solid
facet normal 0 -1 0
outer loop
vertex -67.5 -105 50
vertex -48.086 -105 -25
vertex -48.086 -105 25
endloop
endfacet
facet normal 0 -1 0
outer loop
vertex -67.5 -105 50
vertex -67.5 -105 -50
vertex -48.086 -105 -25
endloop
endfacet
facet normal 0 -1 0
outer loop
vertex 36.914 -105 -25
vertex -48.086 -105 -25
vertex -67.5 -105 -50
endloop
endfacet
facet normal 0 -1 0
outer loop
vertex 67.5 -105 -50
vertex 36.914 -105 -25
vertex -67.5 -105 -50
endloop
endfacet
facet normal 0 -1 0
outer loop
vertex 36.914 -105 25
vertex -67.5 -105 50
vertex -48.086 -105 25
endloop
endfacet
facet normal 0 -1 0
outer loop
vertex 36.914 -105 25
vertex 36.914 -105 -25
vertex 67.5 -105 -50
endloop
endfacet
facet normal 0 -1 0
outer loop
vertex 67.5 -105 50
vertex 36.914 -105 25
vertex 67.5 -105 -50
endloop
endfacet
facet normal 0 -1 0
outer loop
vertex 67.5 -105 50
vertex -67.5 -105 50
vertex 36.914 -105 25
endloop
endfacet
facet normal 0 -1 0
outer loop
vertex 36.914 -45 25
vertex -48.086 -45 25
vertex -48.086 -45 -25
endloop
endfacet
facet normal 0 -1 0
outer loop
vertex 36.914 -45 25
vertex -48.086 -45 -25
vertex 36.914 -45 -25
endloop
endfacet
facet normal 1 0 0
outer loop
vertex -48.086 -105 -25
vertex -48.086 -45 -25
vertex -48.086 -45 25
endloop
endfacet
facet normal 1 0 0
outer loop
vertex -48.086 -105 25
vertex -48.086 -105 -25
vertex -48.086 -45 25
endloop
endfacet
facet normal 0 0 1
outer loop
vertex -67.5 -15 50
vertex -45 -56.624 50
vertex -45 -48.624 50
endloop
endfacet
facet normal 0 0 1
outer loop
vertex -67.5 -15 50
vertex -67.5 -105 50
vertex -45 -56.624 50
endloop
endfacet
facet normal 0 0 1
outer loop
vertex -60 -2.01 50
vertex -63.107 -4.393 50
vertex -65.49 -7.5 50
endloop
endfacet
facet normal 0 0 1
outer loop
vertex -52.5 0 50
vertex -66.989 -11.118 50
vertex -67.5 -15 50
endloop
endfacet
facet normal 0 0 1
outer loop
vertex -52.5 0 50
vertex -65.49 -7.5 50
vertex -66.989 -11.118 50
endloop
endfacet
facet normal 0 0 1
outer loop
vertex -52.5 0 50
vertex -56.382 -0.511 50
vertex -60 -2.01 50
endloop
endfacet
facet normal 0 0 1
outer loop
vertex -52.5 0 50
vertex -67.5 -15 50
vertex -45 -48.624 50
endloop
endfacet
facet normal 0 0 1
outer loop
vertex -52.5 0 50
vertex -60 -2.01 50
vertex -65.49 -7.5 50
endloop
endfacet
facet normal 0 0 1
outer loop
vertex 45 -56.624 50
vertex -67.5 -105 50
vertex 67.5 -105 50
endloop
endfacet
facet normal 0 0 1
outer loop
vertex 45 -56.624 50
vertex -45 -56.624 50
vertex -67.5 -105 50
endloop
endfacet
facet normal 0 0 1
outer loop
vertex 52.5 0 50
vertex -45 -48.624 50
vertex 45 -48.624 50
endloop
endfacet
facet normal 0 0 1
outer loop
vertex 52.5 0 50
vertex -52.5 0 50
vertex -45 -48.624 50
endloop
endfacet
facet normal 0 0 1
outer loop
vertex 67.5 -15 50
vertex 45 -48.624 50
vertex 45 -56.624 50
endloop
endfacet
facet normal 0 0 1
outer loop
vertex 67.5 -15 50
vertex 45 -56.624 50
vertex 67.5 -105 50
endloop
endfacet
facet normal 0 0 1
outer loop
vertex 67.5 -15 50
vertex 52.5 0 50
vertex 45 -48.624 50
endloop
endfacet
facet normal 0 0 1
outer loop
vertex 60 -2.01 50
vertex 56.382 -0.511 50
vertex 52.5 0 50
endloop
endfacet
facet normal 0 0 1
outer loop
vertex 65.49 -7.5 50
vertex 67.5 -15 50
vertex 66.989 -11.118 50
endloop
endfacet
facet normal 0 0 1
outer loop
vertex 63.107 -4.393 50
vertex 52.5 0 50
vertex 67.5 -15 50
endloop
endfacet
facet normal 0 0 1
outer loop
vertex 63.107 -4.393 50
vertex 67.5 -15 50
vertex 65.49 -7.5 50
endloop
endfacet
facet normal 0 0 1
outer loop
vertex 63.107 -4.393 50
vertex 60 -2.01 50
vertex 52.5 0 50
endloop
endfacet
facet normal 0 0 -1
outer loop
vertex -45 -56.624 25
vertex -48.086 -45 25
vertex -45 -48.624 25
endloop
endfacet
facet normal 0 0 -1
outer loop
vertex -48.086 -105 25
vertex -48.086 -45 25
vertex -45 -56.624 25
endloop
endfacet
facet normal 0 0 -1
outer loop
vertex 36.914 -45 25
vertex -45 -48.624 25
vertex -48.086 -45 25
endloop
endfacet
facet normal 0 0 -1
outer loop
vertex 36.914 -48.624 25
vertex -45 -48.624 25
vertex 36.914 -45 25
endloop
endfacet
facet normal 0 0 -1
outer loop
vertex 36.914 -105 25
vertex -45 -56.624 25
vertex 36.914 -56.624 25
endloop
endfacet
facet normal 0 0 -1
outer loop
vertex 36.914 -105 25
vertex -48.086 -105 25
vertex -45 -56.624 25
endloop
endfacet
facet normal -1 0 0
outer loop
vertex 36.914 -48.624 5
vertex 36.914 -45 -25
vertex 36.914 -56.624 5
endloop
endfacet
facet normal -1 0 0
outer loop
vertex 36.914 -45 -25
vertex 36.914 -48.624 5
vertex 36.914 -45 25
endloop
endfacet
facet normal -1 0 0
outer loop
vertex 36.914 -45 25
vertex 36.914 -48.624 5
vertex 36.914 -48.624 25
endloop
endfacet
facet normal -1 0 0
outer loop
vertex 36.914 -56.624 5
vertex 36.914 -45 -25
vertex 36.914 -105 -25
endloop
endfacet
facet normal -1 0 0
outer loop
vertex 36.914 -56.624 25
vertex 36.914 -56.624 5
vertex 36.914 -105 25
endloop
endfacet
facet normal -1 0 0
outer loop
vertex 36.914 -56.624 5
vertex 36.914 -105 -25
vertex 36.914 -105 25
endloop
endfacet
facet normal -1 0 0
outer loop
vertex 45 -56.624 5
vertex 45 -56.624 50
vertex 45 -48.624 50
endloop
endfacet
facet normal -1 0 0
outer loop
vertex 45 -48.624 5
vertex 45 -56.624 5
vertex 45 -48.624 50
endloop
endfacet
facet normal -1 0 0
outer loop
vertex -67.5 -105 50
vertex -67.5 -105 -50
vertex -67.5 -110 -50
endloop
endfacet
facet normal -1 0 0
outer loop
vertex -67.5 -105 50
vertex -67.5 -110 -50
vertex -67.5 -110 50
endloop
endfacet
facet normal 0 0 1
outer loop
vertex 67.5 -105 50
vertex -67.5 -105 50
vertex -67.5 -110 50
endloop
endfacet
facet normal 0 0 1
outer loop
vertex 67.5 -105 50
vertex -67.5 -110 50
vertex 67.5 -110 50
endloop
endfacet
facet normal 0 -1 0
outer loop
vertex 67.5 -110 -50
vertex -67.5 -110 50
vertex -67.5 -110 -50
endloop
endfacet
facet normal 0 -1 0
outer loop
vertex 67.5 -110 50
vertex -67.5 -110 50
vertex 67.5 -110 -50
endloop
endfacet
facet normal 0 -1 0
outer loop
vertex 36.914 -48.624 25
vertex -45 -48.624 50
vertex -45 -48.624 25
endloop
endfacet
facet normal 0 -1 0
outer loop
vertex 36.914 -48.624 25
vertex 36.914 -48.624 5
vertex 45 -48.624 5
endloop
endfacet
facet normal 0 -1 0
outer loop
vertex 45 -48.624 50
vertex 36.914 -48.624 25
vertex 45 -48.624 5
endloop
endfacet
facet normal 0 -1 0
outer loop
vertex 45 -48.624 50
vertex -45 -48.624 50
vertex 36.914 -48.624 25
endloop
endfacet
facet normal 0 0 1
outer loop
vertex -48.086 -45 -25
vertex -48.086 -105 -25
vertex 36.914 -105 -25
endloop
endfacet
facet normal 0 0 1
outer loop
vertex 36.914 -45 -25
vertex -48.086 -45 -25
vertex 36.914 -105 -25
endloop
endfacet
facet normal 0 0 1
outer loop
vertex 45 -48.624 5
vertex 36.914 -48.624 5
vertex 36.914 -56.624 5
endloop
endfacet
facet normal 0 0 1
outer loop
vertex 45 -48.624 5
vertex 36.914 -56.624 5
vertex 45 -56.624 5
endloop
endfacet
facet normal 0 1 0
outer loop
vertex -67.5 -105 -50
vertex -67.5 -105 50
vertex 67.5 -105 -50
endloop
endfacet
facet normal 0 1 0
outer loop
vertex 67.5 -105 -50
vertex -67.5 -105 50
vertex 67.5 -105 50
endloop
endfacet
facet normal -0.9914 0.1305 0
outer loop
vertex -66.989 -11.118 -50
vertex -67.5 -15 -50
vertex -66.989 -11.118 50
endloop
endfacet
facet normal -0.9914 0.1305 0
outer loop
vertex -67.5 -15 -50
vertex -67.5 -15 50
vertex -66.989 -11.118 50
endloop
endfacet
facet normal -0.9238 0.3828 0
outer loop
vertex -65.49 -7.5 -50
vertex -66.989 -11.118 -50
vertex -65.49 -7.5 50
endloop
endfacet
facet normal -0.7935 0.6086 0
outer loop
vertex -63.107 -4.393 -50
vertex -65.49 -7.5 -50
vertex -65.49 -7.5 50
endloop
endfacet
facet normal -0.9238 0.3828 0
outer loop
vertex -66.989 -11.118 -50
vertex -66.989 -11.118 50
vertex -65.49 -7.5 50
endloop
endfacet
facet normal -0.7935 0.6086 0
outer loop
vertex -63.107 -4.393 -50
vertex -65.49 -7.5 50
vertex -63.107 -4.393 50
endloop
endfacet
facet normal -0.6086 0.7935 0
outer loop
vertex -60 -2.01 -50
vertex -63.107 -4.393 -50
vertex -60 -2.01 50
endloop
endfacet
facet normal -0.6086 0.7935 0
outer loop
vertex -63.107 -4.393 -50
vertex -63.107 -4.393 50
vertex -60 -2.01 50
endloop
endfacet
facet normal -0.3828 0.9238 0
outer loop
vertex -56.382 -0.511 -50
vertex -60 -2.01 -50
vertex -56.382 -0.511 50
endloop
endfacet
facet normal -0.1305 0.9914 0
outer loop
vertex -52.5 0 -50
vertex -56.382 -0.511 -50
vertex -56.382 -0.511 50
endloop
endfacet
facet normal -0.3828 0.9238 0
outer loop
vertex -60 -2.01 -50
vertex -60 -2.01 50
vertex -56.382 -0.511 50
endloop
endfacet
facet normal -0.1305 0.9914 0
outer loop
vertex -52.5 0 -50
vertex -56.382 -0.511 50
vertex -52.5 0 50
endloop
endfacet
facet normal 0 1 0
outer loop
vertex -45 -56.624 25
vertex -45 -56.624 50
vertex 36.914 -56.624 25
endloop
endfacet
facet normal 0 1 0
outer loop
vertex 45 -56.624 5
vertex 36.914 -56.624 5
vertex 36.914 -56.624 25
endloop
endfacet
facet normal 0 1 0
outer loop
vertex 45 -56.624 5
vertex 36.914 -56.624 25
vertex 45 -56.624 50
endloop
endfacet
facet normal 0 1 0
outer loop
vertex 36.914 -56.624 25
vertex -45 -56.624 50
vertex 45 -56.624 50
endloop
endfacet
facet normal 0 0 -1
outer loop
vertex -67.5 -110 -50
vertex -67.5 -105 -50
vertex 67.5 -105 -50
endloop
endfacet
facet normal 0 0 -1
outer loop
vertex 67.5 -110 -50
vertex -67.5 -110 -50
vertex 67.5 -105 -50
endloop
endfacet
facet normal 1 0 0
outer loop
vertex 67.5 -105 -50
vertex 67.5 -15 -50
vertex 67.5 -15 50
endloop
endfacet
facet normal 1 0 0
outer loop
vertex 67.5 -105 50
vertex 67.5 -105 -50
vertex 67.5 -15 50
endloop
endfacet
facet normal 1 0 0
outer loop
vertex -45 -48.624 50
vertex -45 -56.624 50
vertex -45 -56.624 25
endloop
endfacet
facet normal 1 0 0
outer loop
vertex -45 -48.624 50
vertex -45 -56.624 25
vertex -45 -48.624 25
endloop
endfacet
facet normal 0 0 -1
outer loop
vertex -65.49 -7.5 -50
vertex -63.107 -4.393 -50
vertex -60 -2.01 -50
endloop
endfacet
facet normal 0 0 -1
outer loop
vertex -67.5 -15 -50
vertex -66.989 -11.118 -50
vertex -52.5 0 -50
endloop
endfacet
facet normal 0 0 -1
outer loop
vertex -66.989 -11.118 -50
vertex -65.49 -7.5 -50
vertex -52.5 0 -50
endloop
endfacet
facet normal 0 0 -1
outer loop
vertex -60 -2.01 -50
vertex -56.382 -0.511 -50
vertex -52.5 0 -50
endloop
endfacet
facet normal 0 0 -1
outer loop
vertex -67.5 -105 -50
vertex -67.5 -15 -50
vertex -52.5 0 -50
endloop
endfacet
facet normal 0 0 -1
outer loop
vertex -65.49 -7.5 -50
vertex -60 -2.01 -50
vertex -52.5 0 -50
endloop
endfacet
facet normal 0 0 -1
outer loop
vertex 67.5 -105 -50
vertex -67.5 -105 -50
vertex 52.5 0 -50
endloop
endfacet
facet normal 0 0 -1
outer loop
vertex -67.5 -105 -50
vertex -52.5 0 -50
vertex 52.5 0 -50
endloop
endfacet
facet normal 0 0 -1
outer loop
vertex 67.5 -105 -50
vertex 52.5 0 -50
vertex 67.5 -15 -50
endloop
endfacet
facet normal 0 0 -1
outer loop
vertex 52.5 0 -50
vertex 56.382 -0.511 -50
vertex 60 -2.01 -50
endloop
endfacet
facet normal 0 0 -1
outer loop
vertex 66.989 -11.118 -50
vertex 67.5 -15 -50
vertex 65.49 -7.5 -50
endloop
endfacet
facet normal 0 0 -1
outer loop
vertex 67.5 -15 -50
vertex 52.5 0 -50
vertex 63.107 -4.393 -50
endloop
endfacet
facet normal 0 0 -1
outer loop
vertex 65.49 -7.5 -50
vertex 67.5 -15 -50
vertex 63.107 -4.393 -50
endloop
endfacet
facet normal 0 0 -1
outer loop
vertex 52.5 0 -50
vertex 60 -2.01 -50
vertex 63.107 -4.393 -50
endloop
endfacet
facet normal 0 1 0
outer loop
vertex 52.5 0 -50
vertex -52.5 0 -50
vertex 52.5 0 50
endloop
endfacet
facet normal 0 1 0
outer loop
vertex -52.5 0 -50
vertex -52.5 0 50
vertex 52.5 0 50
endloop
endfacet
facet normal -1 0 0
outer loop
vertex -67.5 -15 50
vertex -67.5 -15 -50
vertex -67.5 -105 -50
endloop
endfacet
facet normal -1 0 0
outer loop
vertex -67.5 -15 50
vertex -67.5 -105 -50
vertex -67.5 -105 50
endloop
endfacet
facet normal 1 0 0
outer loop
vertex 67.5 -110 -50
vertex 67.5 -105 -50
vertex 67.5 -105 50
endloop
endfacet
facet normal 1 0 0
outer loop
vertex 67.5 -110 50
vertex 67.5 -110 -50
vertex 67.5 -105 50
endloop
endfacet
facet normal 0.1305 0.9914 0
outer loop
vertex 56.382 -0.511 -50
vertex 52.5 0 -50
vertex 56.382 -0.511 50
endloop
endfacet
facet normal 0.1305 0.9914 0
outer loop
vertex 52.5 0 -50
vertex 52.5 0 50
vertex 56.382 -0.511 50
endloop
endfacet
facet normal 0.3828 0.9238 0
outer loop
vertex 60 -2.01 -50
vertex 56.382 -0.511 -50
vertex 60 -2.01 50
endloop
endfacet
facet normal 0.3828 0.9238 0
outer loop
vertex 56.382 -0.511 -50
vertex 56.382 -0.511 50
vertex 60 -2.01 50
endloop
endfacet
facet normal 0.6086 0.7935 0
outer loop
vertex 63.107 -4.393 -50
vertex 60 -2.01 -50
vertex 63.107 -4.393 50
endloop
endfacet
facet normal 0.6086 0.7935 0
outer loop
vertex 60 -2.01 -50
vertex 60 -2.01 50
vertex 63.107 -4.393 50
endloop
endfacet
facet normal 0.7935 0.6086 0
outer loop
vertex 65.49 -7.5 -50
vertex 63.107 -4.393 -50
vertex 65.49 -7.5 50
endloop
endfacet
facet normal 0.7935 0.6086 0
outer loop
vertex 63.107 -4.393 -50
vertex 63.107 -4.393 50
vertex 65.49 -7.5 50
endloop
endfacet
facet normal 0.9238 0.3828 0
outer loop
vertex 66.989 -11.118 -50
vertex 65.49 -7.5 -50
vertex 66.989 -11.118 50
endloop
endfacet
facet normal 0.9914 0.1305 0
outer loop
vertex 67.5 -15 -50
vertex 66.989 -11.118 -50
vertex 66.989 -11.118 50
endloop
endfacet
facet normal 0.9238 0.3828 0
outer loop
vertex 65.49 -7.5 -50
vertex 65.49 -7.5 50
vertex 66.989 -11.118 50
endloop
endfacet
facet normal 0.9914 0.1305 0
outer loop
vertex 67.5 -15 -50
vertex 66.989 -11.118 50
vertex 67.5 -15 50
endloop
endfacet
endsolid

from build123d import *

# Parameters (mm, degrees)
F0_W     = 135
F0_H     = 100
F1_DEPTH = 105
F2_W     = 90
F2_H     = 8
F3_DEPTH = 45
F4_W     = 85
F4_H     = 50
F5_DEPTH = 60
F6_W     = 135
F6_H     = 100
F7_DEPTH = 5
F8_R     = 15
F9_R     = 15


with BuildPart() as f1:
    # F0 (on Front) → F1 (new body)
    with BuildSketch(Plane.XZ):
        Rectangle(F0_W, F0_H)
    extrude(amount=F1_DEPTH)

    # F2 (on face) → F3 (cut)
    with BuildSketch(Plane.XY.offset(50)):
        with Locations((0, -52.623879)):
            Rectangle(F2_W, F2_H)
    extrude(amount=-F3_DEPTH, mode=Mode.SUBTRACT)

    # F4 (on face) → F5 (cut)
    with BuildSketch(Plane.XZ.offset(105)):
        with Locations((-5.58562, 0)):
            Rectangle(F4_W, F4_H)
    extrude(amount=-F5_DEPTH, mode=Mode.SUBTRACT)

    # F8
    f8_edges = [f1.edges().sort_by_distance(p)[0] for p in [
        (-67.5, 0, 0),
    ]]
    fillet(f8_edges, radius=F8_R)

    # F9
    f9_edges = [f1.edges().sort_by_distance(p)[0] for p in [
        (67.5, 0, 0),
    ]]
    fillet(f9_edges, radius=F9_R)


with BuildPart() as f7:
    # F6 (on face) → F7 (new body)
    with BuildSketch(Plane.XZ.offset(105)):
        Rectangle(F6_W, F6_H)
    extrude(amount=F7_DEPTH)


solid = Compound([f1.part, f7.part])
